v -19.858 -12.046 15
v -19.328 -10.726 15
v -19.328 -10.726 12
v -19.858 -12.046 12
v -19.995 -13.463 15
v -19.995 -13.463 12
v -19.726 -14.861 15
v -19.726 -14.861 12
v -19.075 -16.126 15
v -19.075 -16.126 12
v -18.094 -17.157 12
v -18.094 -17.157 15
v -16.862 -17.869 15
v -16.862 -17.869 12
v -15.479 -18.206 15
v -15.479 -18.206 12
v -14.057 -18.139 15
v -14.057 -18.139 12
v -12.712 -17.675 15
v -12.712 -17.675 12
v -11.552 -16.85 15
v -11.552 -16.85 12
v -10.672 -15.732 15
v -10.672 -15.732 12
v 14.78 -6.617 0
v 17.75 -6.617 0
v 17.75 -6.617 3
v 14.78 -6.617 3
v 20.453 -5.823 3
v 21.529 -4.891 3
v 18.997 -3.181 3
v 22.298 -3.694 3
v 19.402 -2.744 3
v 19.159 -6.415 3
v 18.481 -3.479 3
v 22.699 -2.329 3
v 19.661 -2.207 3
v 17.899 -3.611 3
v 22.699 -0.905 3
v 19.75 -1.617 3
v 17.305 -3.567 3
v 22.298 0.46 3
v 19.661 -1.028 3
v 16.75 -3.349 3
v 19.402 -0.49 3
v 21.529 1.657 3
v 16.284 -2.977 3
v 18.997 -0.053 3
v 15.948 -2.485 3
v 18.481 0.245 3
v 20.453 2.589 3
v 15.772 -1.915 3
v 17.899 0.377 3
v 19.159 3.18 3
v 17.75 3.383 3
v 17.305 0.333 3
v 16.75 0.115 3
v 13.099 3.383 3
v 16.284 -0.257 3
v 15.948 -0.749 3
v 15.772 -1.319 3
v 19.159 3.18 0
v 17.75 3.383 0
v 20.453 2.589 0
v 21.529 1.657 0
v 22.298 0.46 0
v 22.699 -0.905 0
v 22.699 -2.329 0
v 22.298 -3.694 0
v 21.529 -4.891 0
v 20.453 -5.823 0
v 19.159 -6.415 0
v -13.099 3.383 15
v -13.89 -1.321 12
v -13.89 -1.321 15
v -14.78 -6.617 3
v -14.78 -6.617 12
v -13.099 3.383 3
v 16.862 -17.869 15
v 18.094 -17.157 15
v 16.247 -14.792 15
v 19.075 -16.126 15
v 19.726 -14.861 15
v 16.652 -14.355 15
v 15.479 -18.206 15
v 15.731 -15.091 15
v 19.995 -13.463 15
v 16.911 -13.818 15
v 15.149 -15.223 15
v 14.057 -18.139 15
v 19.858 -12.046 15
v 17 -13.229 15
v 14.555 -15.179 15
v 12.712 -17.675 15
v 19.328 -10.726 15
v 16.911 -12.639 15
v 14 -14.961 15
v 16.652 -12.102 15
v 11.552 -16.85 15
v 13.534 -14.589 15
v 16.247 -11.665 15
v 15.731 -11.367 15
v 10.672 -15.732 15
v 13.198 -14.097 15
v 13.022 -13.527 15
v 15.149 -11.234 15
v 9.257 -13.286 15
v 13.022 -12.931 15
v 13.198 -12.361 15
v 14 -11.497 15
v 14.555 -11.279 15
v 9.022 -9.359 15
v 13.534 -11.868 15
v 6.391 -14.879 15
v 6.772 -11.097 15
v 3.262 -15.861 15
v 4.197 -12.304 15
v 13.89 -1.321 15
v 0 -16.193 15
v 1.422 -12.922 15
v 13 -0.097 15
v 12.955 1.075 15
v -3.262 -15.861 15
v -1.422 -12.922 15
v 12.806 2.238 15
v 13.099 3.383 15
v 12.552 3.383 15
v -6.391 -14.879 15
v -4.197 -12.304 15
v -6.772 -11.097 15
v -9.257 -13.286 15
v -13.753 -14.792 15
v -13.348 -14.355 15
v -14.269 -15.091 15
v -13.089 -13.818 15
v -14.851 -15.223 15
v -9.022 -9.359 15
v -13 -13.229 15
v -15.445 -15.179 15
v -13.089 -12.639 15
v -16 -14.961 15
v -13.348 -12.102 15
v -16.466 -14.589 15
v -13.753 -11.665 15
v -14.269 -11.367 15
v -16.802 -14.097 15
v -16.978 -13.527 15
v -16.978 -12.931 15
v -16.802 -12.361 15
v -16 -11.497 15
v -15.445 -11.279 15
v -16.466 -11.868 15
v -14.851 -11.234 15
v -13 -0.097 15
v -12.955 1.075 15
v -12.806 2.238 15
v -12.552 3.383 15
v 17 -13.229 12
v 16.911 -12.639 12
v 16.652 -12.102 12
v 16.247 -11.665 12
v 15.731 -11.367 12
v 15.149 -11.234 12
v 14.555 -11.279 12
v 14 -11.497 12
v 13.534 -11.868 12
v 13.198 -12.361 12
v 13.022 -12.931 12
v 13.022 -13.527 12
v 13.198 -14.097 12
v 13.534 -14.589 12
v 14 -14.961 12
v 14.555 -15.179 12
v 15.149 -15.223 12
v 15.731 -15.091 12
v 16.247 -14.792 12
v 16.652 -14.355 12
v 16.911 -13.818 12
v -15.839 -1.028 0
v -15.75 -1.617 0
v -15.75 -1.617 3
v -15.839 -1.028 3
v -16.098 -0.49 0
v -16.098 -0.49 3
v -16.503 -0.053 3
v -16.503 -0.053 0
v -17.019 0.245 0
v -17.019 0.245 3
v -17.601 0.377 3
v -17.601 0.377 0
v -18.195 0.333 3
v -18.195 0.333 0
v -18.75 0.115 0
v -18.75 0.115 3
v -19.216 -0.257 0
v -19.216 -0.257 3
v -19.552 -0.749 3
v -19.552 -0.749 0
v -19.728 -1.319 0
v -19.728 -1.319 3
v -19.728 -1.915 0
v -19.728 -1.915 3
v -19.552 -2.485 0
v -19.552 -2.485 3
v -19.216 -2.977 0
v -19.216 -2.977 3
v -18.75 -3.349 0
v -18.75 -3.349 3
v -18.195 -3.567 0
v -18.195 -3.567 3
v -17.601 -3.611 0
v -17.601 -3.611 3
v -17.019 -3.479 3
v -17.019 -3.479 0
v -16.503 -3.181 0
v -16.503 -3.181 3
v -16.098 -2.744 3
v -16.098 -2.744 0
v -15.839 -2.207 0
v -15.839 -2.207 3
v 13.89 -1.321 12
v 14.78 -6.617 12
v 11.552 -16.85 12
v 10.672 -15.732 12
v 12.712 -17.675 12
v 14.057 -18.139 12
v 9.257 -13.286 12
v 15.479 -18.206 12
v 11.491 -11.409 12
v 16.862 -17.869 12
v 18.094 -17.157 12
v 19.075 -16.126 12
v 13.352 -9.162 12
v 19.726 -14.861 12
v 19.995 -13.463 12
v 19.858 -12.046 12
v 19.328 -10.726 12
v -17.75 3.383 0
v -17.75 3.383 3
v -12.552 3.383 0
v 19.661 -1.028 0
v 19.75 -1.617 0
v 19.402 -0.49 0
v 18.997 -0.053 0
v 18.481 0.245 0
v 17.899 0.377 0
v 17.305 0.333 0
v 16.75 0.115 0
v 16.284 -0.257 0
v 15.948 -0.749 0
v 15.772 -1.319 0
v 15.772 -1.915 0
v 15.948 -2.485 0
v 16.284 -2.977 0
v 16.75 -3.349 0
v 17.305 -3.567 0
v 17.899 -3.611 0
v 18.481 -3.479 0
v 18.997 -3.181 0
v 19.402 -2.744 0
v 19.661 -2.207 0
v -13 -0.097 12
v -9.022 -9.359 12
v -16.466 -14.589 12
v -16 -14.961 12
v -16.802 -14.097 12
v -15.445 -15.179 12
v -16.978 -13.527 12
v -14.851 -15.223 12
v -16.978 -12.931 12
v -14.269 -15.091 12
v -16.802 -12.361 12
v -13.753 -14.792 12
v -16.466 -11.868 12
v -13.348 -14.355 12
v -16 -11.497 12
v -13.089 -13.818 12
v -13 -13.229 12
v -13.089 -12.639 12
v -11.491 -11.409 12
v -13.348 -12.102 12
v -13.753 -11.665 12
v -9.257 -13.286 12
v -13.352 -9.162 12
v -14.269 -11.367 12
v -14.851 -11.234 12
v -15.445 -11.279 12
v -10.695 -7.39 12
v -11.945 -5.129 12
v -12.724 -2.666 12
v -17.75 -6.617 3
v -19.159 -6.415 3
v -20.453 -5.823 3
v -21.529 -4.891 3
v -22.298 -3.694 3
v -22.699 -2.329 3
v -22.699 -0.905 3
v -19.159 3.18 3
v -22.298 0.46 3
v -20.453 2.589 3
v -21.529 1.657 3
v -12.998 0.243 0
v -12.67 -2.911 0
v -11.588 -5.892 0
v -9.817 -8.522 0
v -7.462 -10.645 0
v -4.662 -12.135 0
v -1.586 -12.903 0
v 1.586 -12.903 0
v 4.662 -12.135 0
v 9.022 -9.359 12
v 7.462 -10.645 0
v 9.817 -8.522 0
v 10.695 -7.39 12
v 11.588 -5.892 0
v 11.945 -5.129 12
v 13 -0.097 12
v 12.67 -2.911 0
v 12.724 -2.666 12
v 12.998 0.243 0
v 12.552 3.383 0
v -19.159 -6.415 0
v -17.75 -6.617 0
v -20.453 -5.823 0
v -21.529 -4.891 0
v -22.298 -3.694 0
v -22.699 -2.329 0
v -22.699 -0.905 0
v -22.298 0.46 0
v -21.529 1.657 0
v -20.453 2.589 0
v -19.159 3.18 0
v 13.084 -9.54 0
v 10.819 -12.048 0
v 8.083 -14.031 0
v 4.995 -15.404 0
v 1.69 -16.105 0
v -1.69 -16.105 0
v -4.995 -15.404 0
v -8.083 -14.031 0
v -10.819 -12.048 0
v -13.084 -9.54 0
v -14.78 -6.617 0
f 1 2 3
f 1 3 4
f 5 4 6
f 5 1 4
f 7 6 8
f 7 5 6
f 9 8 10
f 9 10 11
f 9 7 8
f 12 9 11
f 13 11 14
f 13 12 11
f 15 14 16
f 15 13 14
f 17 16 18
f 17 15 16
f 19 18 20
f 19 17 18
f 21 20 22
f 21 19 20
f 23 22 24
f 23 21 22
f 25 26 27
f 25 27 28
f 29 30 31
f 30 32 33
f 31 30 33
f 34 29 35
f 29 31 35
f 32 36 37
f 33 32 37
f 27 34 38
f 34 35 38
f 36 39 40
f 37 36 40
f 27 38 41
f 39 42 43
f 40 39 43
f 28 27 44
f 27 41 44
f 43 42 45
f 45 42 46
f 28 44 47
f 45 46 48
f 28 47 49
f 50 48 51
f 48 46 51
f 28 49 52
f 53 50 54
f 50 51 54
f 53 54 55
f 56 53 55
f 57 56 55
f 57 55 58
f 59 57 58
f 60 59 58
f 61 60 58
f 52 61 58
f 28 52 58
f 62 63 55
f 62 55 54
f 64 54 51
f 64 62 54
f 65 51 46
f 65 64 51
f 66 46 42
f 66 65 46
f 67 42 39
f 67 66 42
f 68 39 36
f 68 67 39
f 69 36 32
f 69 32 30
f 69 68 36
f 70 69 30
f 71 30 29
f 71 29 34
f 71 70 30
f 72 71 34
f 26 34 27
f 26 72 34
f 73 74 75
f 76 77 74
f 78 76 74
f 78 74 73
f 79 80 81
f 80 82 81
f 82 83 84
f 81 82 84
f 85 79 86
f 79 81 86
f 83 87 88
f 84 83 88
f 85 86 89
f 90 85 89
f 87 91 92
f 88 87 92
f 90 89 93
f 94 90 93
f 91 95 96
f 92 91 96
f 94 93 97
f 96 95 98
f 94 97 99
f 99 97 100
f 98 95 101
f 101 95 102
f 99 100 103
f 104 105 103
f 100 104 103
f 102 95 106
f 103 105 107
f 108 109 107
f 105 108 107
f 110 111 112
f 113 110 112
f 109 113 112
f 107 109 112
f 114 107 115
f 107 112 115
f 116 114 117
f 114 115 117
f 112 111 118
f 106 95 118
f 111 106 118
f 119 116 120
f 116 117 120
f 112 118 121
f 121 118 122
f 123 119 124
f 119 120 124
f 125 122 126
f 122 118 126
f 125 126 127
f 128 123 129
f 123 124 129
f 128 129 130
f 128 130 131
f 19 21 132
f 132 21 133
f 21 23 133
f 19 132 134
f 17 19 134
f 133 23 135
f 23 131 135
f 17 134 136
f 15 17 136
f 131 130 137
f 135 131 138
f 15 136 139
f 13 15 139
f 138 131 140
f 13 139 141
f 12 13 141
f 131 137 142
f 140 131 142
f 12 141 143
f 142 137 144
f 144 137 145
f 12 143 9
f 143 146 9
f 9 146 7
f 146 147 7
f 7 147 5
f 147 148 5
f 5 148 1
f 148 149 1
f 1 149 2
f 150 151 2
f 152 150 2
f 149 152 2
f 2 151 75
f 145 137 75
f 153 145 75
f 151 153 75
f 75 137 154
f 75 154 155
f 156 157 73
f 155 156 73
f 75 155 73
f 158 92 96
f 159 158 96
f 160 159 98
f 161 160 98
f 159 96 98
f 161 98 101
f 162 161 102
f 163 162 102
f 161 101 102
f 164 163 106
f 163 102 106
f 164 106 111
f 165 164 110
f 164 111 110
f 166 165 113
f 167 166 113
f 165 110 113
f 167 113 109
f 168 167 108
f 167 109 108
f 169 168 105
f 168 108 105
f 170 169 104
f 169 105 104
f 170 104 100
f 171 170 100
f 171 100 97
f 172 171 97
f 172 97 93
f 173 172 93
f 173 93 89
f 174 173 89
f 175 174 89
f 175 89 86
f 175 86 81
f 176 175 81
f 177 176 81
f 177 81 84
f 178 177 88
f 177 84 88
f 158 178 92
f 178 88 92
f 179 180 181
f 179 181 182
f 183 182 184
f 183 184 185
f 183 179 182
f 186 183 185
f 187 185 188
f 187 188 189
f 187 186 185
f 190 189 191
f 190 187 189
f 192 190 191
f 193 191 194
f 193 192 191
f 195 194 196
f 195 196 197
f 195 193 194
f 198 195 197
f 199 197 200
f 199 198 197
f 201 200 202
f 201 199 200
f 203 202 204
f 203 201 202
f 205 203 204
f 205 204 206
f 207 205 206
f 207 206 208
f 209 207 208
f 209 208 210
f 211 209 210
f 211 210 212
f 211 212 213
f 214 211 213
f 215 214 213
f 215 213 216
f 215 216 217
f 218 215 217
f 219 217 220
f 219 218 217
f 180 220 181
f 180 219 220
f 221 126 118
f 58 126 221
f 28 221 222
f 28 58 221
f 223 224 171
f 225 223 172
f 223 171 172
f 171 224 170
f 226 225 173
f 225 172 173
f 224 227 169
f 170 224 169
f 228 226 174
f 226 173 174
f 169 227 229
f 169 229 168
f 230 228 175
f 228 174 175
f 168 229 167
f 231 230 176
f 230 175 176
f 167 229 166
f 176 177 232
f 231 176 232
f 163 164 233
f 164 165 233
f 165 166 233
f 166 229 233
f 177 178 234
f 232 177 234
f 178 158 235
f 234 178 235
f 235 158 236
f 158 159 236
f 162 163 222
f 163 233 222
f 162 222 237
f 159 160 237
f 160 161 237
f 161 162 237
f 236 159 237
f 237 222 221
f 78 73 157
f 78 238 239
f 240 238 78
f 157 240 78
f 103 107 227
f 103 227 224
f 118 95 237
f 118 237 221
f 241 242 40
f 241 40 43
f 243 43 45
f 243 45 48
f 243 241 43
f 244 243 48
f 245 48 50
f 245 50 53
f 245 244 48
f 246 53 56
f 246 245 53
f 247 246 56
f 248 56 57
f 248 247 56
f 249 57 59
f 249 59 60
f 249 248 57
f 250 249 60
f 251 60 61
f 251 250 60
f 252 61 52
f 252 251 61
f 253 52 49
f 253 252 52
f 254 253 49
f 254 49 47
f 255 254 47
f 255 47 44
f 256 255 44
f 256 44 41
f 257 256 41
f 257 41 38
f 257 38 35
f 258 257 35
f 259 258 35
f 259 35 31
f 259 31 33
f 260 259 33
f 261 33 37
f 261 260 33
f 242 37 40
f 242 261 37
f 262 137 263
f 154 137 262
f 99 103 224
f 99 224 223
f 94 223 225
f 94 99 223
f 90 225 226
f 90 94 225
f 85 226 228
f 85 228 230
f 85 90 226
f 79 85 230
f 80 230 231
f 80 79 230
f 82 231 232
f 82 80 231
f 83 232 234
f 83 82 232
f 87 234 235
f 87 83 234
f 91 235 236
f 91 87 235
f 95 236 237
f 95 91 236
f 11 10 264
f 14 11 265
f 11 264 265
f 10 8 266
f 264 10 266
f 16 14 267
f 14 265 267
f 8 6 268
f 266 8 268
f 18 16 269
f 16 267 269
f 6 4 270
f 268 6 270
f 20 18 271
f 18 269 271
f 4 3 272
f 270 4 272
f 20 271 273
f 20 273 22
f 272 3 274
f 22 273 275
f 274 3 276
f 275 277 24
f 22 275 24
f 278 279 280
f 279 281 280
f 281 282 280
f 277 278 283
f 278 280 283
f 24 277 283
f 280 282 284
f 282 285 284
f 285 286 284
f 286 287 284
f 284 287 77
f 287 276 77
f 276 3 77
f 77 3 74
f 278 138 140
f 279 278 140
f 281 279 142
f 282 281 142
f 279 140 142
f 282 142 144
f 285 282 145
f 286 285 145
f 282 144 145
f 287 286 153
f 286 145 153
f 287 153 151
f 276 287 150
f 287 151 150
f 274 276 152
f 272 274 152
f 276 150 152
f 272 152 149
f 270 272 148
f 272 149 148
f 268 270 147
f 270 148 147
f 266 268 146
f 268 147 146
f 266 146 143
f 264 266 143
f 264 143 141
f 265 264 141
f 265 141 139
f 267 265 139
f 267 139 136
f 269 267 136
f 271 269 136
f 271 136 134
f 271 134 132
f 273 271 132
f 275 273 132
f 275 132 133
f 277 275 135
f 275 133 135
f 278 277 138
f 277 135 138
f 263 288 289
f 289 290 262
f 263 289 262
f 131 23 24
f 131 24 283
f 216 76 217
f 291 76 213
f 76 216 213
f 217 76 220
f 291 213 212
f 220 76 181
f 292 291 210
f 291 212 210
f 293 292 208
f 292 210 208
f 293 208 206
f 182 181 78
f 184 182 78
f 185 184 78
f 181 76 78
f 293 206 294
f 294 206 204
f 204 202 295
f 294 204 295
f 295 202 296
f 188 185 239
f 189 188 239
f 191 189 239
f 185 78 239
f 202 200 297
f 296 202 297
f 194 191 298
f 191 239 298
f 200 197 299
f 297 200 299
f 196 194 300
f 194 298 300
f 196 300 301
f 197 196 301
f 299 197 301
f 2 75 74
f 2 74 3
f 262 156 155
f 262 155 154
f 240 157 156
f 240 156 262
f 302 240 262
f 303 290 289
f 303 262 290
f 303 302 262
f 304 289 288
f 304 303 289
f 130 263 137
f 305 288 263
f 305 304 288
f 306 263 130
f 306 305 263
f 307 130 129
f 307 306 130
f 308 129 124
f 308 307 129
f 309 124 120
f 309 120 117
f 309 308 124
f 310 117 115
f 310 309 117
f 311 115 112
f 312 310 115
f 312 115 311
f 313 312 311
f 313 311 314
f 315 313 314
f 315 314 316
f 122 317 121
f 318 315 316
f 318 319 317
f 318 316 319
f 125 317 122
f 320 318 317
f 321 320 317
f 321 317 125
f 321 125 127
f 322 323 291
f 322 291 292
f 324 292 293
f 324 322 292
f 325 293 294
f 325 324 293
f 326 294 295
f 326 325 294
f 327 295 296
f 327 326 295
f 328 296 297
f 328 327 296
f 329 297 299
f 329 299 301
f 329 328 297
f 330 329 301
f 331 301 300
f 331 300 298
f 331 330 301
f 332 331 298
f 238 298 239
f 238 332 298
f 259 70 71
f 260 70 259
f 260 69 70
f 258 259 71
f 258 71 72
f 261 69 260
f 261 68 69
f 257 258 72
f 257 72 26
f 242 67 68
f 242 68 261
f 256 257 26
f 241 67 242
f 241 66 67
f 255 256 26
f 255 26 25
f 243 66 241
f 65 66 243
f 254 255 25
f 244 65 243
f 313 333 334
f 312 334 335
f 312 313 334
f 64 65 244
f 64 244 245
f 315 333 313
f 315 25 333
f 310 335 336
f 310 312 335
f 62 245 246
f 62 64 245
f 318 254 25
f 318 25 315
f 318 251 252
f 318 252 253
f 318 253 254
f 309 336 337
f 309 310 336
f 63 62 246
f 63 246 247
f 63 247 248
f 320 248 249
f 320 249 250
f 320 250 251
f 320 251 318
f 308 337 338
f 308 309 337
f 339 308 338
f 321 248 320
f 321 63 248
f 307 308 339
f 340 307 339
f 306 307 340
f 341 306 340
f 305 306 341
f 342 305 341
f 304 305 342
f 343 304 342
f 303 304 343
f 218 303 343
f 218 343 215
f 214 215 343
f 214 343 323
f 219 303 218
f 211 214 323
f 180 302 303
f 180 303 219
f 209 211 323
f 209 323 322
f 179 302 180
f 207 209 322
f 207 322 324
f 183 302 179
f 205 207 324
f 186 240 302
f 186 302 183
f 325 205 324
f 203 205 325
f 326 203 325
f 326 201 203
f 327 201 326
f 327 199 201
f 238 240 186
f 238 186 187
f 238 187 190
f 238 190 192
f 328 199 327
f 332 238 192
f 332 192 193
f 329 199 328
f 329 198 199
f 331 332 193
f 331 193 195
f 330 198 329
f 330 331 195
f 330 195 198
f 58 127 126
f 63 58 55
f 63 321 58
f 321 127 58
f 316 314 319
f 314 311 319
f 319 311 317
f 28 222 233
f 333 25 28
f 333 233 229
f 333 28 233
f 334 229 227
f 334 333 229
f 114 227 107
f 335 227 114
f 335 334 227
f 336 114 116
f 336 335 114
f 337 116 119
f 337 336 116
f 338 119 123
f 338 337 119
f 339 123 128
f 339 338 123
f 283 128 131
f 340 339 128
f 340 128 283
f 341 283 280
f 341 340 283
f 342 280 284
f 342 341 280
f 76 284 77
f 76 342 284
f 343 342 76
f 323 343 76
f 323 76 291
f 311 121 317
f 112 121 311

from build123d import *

# Parameters (mm, degrees)
ESBO_O1_R                = 2
RESSALTO_EXTRUS_O1_DEPTH = 3
RESSALTO_EXTRUS_O2_DEPTH = 12
ESBO_O3_R                = 2
RESSALTO_EXTRUS_O3_DEPTH = 3


with BuildPart() as part:
    # Esboço1 → Ressalto-extrusão1 (new body)
    with BuildSketch(Plane.XY):
        with BuildLine():
            Line((-17.75, 3.382927425), (-13.099117311, 3.382927425))
            Line((-13.099117311, 3.382927425), (-12.552123407, 3.382927425))
            ThreePointArc((-12.552123407, 3.382927425), (0, -13), (12.552123407, 3.382927425))
            Line((12.552123407, 3.382927425), (13.099117311, 3.382927425))
            Line((13.099117311, 3.382927425), (17.75, 3.382927425))
            ThreePointArc((17.75, 3.382927425), (22.75, -1.617072575), (17.75, -6.617072575))
            Line((17.75, -6.617072575), (14.779561157, -6.617072575))
            ThreePointArc((14.779561157, -6.617072575), (0, -16.193241721), (-14.779561157, -6.617072575))
            Line((-14.779561157, -6.617072575), (-17.75, -6.617072575))
            ThreePointArc((-17.75, -6.617072575), (-22.75, -1.617072575), (-17.75, 3.382927425))
        make_face()
        with Locations((-17.75, -1.617072575)):
            Circle(ESBO_O1_R, mode=Mode.SUBTRACT)
        with Locations((17.75, -1.617072575)):
            Circle(ESBO_O1_R, mode=Mode.SUBTRACT)
    extrude(amount=RESSALTO_EXTRUS_O1_DEPTH)

    # Esboço2 → Ressalto-extrusão2 (add)
    with BuildSketch(Plane.XY.offset(3)):
        with BuildLine():
            Line((13.099117311, 3.382927425), (14.779561157, -6.617072575))
            ThreePointArc((14.779561157, -6.617072575), (0, -16.193241721), (-14.779561157, -6.617072575))
            Line((-14.779561157, -6.617072575), (-13.099117311, 3.382927425))
            Line((-13.099117311, 3.382927425), (-12.552123407, 3.382927425))
            ThreePointArc((-12.552123407, 3.382927425), (0, -13), (12.552123407, 3.382927425))
            Line((12.552123407, 3.382927425), (13.099117311, 3.382927425))
        make_face()
    extrude(amount=RESSALTO_EXTRUS_O2_DEPTH)

    # Esboço3 → Ressalto-extrusão3 (add)
    with BuildSketch(Plane.XY.offset(15)):
        with BuildLine():
            Line((13.077187708, 0.083527365), (8.154782397, -11.379785765))
            Line((8.154782397, -11.379785765), (10.671688275, -15.731898104))
            ThreePointArc((10.671688275, -15.731898104), (17.503141549, -17.55706828), (19.328311725, -10.725615007))
            Line((19.328311725, -10.725615007), (13.077187708, 0.083527365))
        make_face()
        with Locations((15, -13.228756555)):
            Circle(ESBO_O3_R, mode=Mode.SUBTRACT)
        with BuildLine():
            Line((-10.671688275, -15.731898104), (-8.154782397, -11.379785765))
            Line((-8.154782397, -11.379785765), (-13.077187708, 0.083527365))
            Line((-13.077187708, 0.083527365), (-19.328311725, -10.725615007))
            ThreePointArc((-19.328311725, -10.725615007), (-17.503141549, -17.55706828), (-10.671688275, -15.731898104))
        make_face()
        with Locations((-15, -13.228756555)):
            Circle(ESBO_O3_R, mode=Mode.SUBTRACT)
    extrude(amount=-RESSALTO_EXTRUS_O3_DEPTH)


solid = part.part
